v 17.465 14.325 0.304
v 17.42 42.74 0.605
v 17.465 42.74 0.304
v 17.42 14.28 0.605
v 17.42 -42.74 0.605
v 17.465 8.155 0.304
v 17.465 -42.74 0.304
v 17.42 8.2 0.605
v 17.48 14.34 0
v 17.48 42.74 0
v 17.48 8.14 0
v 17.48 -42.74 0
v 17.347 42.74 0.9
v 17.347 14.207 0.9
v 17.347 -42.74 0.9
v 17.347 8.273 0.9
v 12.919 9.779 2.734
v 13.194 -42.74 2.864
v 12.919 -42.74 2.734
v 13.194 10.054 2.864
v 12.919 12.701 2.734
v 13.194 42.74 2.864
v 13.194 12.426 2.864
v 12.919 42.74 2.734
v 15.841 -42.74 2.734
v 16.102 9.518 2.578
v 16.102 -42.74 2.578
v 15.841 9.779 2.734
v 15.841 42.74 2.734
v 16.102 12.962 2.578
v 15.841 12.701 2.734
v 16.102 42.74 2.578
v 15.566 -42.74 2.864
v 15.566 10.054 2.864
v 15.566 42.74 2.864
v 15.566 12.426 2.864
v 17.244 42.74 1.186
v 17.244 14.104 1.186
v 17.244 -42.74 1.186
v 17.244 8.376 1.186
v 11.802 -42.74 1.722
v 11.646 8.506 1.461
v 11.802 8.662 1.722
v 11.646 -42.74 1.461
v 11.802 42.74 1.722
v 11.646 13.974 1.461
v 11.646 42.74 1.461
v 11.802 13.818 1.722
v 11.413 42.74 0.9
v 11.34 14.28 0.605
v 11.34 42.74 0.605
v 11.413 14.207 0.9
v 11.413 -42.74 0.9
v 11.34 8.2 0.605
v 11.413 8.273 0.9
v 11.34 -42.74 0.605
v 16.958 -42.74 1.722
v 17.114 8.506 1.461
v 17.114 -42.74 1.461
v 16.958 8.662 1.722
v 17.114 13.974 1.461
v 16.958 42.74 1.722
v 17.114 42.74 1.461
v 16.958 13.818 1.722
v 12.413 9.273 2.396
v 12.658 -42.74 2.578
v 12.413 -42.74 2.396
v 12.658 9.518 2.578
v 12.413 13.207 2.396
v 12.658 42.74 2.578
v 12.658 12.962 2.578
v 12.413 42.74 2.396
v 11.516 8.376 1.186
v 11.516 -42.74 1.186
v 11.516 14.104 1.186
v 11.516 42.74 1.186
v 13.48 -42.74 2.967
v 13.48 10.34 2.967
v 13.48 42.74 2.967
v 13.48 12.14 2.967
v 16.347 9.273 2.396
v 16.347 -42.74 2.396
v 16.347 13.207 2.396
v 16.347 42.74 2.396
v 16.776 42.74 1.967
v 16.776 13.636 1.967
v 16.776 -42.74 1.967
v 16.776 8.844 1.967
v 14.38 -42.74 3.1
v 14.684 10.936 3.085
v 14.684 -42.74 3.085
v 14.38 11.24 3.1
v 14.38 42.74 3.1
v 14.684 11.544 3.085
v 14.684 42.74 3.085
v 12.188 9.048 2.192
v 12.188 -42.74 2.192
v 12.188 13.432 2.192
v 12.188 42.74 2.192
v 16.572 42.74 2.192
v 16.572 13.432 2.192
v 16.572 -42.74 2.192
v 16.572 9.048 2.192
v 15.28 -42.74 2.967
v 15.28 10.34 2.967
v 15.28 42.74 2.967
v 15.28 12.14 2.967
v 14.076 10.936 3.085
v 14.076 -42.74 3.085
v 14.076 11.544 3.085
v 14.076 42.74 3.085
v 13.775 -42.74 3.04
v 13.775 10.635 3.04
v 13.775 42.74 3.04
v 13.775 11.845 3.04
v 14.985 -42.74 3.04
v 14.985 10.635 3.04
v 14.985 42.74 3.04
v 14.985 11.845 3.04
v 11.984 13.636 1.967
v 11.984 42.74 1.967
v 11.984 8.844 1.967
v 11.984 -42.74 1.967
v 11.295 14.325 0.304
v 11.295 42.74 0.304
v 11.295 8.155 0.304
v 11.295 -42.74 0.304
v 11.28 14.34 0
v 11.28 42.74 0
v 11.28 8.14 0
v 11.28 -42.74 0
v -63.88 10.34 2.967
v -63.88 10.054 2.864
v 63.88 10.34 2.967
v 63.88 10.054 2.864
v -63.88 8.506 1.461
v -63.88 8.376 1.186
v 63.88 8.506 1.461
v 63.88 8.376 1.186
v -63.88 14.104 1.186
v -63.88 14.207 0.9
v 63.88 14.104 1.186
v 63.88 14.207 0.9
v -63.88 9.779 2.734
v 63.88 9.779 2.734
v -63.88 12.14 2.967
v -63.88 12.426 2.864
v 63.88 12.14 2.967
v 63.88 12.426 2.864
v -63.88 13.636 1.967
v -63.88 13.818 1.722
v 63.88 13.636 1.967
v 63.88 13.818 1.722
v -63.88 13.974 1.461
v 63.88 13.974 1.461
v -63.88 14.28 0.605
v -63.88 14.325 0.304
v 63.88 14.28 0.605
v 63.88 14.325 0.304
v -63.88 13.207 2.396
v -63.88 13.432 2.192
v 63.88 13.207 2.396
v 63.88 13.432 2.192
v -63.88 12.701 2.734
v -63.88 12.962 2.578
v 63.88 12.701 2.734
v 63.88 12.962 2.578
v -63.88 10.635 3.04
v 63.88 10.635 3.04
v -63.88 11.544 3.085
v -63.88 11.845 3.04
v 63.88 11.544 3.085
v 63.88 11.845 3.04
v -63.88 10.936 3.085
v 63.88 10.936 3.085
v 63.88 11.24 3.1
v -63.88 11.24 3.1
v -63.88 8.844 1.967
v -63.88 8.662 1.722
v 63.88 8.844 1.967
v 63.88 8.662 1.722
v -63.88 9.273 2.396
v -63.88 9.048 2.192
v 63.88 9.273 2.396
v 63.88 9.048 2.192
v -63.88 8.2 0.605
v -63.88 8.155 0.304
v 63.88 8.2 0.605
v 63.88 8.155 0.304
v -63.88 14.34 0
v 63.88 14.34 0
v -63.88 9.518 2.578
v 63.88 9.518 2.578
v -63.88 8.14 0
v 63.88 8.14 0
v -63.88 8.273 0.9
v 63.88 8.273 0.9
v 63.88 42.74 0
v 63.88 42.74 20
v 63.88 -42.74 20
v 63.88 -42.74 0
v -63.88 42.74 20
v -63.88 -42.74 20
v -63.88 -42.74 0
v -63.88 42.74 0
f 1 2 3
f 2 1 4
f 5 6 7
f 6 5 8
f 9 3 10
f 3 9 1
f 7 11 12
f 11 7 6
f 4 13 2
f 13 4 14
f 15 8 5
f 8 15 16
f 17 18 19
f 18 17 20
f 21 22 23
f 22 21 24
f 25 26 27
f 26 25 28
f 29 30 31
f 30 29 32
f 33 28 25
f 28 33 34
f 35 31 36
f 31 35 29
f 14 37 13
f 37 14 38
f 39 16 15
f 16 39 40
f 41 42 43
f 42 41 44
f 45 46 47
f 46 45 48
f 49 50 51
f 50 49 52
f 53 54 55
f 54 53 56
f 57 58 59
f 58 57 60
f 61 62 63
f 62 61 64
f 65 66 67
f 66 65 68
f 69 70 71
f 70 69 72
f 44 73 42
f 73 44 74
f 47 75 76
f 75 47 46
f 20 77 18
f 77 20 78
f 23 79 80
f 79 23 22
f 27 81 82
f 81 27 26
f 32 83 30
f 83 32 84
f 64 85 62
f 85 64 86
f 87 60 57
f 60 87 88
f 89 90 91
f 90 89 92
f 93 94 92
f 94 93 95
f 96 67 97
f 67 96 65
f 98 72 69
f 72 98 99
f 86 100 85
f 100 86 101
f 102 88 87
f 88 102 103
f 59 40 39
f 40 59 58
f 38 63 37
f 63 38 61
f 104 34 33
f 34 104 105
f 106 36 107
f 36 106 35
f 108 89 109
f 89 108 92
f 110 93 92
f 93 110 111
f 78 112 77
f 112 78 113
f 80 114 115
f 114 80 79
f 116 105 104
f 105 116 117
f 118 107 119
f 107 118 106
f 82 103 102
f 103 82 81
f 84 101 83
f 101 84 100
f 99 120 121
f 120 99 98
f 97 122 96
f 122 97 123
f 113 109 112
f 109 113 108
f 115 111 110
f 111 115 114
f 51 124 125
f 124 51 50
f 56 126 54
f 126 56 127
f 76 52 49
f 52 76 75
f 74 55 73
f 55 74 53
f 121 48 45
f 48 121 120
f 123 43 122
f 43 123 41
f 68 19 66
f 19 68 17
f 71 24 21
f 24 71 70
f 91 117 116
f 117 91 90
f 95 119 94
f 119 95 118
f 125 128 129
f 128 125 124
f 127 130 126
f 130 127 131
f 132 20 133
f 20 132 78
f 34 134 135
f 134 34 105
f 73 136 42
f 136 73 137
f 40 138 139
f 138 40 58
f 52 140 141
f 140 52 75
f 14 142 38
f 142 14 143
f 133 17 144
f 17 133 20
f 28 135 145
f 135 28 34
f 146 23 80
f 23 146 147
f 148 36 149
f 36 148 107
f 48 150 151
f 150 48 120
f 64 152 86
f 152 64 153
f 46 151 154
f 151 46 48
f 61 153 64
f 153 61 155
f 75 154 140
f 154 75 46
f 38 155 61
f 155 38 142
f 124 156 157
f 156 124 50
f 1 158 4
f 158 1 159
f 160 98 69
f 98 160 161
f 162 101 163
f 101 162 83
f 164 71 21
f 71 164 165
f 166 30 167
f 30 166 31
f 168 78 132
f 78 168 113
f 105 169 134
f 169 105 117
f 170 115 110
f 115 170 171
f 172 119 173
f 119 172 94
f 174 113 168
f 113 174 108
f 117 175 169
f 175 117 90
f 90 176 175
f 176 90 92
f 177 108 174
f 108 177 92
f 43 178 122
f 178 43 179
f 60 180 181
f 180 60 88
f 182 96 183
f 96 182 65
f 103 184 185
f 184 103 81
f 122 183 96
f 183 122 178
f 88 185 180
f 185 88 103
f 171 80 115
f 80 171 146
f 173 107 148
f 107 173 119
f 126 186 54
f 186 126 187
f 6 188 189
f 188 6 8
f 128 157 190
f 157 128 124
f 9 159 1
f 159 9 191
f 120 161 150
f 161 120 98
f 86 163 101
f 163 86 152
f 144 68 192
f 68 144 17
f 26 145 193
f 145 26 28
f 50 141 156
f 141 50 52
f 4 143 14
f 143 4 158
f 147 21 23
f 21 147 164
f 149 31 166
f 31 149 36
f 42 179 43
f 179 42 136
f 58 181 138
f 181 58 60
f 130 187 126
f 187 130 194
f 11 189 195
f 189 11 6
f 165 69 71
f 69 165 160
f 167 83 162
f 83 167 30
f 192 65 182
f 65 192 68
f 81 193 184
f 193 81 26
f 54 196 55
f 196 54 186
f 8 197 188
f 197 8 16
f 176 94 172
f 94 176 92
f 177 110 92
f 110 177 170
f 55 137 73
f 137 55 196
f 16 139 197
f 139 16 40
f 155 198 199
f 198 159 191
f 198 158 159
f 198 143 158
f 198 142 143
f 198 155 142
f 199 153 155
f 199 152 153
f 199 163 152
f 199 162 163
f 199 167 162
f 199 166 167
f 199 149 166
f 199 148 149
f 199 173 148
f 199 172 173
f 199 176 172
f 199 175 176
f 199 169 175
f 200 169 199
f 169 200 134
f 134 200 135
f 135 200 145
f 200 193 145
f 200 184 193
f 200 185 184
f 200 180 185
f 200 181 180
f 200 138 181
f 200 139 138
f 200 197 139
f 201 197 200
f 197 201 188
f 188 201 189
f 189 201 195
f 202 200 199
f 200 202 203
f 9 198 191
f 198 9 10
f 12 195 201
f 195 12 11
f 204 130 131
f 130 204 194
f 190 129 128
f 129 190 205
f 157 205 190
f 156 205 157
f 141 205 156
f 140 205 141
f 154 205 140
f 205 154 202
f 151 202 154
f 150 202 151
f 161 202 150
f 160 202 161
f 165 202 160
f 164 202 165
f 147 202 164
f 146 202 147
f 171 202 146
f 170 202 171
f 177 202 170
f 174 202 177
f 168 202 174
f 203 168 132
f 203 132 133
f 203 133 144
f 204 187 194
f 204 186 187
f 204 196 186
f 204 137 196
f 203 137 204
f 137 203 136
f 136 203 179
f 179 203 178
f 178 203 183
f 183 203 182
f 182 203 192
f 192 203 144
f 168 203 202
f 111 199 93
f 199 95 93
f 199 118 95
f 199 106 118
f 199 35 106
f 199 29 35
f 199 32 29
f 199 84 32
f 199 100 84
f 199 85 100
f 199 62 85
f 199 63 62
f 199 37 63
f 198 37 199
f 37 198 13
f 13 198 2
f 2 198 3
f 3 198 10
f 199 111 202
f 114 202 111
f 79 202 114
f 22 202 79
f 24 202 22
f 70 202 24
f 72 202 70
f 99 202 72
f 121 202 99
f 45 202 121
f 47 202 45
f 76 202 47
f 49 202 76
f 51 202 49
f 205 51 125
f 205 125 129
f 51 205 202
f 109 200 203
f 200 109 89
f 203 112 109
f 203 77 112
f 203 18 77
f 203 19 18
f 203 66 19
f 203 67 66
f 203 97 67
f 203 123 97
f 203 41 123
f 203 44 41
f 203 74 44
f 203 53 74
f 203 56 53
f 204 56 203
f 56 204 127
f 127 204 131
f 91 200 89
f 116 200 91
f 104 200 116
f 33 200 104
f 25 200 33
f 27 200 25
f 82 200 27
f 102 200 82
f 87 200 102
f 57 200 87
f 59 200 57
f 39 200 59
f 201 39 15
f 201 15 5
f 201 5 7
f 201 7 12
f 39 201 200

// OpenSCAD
// Built by bench/smallmodels/features/compiler.py from a list of features.
$fn = 64;
difference() {
  union() {
    translate([0, 0, 0]) translate([-63.88, -42.74, 0]) cube([127.76, 85.48, 20]);
  }
  union() {
    translate([14.38, 11.24, 0]) rotate([0, 0, 0]) rotate([90, 0, 0]) cylinder(d = 6.2, h = 1080, center = true);
    translate([14.38, 11.24, 0]) rotate([0, 0, 0]) rotate([0, 90, 0]) cylinder(d = 6.2, h = 1080, center = true);
  }
}
union() {
    translate([-5, -5, 0]) rotate([0, 0, 0]) translate([-2.5, -2.5, 0]) cube([5, 5, 20]);
  }
